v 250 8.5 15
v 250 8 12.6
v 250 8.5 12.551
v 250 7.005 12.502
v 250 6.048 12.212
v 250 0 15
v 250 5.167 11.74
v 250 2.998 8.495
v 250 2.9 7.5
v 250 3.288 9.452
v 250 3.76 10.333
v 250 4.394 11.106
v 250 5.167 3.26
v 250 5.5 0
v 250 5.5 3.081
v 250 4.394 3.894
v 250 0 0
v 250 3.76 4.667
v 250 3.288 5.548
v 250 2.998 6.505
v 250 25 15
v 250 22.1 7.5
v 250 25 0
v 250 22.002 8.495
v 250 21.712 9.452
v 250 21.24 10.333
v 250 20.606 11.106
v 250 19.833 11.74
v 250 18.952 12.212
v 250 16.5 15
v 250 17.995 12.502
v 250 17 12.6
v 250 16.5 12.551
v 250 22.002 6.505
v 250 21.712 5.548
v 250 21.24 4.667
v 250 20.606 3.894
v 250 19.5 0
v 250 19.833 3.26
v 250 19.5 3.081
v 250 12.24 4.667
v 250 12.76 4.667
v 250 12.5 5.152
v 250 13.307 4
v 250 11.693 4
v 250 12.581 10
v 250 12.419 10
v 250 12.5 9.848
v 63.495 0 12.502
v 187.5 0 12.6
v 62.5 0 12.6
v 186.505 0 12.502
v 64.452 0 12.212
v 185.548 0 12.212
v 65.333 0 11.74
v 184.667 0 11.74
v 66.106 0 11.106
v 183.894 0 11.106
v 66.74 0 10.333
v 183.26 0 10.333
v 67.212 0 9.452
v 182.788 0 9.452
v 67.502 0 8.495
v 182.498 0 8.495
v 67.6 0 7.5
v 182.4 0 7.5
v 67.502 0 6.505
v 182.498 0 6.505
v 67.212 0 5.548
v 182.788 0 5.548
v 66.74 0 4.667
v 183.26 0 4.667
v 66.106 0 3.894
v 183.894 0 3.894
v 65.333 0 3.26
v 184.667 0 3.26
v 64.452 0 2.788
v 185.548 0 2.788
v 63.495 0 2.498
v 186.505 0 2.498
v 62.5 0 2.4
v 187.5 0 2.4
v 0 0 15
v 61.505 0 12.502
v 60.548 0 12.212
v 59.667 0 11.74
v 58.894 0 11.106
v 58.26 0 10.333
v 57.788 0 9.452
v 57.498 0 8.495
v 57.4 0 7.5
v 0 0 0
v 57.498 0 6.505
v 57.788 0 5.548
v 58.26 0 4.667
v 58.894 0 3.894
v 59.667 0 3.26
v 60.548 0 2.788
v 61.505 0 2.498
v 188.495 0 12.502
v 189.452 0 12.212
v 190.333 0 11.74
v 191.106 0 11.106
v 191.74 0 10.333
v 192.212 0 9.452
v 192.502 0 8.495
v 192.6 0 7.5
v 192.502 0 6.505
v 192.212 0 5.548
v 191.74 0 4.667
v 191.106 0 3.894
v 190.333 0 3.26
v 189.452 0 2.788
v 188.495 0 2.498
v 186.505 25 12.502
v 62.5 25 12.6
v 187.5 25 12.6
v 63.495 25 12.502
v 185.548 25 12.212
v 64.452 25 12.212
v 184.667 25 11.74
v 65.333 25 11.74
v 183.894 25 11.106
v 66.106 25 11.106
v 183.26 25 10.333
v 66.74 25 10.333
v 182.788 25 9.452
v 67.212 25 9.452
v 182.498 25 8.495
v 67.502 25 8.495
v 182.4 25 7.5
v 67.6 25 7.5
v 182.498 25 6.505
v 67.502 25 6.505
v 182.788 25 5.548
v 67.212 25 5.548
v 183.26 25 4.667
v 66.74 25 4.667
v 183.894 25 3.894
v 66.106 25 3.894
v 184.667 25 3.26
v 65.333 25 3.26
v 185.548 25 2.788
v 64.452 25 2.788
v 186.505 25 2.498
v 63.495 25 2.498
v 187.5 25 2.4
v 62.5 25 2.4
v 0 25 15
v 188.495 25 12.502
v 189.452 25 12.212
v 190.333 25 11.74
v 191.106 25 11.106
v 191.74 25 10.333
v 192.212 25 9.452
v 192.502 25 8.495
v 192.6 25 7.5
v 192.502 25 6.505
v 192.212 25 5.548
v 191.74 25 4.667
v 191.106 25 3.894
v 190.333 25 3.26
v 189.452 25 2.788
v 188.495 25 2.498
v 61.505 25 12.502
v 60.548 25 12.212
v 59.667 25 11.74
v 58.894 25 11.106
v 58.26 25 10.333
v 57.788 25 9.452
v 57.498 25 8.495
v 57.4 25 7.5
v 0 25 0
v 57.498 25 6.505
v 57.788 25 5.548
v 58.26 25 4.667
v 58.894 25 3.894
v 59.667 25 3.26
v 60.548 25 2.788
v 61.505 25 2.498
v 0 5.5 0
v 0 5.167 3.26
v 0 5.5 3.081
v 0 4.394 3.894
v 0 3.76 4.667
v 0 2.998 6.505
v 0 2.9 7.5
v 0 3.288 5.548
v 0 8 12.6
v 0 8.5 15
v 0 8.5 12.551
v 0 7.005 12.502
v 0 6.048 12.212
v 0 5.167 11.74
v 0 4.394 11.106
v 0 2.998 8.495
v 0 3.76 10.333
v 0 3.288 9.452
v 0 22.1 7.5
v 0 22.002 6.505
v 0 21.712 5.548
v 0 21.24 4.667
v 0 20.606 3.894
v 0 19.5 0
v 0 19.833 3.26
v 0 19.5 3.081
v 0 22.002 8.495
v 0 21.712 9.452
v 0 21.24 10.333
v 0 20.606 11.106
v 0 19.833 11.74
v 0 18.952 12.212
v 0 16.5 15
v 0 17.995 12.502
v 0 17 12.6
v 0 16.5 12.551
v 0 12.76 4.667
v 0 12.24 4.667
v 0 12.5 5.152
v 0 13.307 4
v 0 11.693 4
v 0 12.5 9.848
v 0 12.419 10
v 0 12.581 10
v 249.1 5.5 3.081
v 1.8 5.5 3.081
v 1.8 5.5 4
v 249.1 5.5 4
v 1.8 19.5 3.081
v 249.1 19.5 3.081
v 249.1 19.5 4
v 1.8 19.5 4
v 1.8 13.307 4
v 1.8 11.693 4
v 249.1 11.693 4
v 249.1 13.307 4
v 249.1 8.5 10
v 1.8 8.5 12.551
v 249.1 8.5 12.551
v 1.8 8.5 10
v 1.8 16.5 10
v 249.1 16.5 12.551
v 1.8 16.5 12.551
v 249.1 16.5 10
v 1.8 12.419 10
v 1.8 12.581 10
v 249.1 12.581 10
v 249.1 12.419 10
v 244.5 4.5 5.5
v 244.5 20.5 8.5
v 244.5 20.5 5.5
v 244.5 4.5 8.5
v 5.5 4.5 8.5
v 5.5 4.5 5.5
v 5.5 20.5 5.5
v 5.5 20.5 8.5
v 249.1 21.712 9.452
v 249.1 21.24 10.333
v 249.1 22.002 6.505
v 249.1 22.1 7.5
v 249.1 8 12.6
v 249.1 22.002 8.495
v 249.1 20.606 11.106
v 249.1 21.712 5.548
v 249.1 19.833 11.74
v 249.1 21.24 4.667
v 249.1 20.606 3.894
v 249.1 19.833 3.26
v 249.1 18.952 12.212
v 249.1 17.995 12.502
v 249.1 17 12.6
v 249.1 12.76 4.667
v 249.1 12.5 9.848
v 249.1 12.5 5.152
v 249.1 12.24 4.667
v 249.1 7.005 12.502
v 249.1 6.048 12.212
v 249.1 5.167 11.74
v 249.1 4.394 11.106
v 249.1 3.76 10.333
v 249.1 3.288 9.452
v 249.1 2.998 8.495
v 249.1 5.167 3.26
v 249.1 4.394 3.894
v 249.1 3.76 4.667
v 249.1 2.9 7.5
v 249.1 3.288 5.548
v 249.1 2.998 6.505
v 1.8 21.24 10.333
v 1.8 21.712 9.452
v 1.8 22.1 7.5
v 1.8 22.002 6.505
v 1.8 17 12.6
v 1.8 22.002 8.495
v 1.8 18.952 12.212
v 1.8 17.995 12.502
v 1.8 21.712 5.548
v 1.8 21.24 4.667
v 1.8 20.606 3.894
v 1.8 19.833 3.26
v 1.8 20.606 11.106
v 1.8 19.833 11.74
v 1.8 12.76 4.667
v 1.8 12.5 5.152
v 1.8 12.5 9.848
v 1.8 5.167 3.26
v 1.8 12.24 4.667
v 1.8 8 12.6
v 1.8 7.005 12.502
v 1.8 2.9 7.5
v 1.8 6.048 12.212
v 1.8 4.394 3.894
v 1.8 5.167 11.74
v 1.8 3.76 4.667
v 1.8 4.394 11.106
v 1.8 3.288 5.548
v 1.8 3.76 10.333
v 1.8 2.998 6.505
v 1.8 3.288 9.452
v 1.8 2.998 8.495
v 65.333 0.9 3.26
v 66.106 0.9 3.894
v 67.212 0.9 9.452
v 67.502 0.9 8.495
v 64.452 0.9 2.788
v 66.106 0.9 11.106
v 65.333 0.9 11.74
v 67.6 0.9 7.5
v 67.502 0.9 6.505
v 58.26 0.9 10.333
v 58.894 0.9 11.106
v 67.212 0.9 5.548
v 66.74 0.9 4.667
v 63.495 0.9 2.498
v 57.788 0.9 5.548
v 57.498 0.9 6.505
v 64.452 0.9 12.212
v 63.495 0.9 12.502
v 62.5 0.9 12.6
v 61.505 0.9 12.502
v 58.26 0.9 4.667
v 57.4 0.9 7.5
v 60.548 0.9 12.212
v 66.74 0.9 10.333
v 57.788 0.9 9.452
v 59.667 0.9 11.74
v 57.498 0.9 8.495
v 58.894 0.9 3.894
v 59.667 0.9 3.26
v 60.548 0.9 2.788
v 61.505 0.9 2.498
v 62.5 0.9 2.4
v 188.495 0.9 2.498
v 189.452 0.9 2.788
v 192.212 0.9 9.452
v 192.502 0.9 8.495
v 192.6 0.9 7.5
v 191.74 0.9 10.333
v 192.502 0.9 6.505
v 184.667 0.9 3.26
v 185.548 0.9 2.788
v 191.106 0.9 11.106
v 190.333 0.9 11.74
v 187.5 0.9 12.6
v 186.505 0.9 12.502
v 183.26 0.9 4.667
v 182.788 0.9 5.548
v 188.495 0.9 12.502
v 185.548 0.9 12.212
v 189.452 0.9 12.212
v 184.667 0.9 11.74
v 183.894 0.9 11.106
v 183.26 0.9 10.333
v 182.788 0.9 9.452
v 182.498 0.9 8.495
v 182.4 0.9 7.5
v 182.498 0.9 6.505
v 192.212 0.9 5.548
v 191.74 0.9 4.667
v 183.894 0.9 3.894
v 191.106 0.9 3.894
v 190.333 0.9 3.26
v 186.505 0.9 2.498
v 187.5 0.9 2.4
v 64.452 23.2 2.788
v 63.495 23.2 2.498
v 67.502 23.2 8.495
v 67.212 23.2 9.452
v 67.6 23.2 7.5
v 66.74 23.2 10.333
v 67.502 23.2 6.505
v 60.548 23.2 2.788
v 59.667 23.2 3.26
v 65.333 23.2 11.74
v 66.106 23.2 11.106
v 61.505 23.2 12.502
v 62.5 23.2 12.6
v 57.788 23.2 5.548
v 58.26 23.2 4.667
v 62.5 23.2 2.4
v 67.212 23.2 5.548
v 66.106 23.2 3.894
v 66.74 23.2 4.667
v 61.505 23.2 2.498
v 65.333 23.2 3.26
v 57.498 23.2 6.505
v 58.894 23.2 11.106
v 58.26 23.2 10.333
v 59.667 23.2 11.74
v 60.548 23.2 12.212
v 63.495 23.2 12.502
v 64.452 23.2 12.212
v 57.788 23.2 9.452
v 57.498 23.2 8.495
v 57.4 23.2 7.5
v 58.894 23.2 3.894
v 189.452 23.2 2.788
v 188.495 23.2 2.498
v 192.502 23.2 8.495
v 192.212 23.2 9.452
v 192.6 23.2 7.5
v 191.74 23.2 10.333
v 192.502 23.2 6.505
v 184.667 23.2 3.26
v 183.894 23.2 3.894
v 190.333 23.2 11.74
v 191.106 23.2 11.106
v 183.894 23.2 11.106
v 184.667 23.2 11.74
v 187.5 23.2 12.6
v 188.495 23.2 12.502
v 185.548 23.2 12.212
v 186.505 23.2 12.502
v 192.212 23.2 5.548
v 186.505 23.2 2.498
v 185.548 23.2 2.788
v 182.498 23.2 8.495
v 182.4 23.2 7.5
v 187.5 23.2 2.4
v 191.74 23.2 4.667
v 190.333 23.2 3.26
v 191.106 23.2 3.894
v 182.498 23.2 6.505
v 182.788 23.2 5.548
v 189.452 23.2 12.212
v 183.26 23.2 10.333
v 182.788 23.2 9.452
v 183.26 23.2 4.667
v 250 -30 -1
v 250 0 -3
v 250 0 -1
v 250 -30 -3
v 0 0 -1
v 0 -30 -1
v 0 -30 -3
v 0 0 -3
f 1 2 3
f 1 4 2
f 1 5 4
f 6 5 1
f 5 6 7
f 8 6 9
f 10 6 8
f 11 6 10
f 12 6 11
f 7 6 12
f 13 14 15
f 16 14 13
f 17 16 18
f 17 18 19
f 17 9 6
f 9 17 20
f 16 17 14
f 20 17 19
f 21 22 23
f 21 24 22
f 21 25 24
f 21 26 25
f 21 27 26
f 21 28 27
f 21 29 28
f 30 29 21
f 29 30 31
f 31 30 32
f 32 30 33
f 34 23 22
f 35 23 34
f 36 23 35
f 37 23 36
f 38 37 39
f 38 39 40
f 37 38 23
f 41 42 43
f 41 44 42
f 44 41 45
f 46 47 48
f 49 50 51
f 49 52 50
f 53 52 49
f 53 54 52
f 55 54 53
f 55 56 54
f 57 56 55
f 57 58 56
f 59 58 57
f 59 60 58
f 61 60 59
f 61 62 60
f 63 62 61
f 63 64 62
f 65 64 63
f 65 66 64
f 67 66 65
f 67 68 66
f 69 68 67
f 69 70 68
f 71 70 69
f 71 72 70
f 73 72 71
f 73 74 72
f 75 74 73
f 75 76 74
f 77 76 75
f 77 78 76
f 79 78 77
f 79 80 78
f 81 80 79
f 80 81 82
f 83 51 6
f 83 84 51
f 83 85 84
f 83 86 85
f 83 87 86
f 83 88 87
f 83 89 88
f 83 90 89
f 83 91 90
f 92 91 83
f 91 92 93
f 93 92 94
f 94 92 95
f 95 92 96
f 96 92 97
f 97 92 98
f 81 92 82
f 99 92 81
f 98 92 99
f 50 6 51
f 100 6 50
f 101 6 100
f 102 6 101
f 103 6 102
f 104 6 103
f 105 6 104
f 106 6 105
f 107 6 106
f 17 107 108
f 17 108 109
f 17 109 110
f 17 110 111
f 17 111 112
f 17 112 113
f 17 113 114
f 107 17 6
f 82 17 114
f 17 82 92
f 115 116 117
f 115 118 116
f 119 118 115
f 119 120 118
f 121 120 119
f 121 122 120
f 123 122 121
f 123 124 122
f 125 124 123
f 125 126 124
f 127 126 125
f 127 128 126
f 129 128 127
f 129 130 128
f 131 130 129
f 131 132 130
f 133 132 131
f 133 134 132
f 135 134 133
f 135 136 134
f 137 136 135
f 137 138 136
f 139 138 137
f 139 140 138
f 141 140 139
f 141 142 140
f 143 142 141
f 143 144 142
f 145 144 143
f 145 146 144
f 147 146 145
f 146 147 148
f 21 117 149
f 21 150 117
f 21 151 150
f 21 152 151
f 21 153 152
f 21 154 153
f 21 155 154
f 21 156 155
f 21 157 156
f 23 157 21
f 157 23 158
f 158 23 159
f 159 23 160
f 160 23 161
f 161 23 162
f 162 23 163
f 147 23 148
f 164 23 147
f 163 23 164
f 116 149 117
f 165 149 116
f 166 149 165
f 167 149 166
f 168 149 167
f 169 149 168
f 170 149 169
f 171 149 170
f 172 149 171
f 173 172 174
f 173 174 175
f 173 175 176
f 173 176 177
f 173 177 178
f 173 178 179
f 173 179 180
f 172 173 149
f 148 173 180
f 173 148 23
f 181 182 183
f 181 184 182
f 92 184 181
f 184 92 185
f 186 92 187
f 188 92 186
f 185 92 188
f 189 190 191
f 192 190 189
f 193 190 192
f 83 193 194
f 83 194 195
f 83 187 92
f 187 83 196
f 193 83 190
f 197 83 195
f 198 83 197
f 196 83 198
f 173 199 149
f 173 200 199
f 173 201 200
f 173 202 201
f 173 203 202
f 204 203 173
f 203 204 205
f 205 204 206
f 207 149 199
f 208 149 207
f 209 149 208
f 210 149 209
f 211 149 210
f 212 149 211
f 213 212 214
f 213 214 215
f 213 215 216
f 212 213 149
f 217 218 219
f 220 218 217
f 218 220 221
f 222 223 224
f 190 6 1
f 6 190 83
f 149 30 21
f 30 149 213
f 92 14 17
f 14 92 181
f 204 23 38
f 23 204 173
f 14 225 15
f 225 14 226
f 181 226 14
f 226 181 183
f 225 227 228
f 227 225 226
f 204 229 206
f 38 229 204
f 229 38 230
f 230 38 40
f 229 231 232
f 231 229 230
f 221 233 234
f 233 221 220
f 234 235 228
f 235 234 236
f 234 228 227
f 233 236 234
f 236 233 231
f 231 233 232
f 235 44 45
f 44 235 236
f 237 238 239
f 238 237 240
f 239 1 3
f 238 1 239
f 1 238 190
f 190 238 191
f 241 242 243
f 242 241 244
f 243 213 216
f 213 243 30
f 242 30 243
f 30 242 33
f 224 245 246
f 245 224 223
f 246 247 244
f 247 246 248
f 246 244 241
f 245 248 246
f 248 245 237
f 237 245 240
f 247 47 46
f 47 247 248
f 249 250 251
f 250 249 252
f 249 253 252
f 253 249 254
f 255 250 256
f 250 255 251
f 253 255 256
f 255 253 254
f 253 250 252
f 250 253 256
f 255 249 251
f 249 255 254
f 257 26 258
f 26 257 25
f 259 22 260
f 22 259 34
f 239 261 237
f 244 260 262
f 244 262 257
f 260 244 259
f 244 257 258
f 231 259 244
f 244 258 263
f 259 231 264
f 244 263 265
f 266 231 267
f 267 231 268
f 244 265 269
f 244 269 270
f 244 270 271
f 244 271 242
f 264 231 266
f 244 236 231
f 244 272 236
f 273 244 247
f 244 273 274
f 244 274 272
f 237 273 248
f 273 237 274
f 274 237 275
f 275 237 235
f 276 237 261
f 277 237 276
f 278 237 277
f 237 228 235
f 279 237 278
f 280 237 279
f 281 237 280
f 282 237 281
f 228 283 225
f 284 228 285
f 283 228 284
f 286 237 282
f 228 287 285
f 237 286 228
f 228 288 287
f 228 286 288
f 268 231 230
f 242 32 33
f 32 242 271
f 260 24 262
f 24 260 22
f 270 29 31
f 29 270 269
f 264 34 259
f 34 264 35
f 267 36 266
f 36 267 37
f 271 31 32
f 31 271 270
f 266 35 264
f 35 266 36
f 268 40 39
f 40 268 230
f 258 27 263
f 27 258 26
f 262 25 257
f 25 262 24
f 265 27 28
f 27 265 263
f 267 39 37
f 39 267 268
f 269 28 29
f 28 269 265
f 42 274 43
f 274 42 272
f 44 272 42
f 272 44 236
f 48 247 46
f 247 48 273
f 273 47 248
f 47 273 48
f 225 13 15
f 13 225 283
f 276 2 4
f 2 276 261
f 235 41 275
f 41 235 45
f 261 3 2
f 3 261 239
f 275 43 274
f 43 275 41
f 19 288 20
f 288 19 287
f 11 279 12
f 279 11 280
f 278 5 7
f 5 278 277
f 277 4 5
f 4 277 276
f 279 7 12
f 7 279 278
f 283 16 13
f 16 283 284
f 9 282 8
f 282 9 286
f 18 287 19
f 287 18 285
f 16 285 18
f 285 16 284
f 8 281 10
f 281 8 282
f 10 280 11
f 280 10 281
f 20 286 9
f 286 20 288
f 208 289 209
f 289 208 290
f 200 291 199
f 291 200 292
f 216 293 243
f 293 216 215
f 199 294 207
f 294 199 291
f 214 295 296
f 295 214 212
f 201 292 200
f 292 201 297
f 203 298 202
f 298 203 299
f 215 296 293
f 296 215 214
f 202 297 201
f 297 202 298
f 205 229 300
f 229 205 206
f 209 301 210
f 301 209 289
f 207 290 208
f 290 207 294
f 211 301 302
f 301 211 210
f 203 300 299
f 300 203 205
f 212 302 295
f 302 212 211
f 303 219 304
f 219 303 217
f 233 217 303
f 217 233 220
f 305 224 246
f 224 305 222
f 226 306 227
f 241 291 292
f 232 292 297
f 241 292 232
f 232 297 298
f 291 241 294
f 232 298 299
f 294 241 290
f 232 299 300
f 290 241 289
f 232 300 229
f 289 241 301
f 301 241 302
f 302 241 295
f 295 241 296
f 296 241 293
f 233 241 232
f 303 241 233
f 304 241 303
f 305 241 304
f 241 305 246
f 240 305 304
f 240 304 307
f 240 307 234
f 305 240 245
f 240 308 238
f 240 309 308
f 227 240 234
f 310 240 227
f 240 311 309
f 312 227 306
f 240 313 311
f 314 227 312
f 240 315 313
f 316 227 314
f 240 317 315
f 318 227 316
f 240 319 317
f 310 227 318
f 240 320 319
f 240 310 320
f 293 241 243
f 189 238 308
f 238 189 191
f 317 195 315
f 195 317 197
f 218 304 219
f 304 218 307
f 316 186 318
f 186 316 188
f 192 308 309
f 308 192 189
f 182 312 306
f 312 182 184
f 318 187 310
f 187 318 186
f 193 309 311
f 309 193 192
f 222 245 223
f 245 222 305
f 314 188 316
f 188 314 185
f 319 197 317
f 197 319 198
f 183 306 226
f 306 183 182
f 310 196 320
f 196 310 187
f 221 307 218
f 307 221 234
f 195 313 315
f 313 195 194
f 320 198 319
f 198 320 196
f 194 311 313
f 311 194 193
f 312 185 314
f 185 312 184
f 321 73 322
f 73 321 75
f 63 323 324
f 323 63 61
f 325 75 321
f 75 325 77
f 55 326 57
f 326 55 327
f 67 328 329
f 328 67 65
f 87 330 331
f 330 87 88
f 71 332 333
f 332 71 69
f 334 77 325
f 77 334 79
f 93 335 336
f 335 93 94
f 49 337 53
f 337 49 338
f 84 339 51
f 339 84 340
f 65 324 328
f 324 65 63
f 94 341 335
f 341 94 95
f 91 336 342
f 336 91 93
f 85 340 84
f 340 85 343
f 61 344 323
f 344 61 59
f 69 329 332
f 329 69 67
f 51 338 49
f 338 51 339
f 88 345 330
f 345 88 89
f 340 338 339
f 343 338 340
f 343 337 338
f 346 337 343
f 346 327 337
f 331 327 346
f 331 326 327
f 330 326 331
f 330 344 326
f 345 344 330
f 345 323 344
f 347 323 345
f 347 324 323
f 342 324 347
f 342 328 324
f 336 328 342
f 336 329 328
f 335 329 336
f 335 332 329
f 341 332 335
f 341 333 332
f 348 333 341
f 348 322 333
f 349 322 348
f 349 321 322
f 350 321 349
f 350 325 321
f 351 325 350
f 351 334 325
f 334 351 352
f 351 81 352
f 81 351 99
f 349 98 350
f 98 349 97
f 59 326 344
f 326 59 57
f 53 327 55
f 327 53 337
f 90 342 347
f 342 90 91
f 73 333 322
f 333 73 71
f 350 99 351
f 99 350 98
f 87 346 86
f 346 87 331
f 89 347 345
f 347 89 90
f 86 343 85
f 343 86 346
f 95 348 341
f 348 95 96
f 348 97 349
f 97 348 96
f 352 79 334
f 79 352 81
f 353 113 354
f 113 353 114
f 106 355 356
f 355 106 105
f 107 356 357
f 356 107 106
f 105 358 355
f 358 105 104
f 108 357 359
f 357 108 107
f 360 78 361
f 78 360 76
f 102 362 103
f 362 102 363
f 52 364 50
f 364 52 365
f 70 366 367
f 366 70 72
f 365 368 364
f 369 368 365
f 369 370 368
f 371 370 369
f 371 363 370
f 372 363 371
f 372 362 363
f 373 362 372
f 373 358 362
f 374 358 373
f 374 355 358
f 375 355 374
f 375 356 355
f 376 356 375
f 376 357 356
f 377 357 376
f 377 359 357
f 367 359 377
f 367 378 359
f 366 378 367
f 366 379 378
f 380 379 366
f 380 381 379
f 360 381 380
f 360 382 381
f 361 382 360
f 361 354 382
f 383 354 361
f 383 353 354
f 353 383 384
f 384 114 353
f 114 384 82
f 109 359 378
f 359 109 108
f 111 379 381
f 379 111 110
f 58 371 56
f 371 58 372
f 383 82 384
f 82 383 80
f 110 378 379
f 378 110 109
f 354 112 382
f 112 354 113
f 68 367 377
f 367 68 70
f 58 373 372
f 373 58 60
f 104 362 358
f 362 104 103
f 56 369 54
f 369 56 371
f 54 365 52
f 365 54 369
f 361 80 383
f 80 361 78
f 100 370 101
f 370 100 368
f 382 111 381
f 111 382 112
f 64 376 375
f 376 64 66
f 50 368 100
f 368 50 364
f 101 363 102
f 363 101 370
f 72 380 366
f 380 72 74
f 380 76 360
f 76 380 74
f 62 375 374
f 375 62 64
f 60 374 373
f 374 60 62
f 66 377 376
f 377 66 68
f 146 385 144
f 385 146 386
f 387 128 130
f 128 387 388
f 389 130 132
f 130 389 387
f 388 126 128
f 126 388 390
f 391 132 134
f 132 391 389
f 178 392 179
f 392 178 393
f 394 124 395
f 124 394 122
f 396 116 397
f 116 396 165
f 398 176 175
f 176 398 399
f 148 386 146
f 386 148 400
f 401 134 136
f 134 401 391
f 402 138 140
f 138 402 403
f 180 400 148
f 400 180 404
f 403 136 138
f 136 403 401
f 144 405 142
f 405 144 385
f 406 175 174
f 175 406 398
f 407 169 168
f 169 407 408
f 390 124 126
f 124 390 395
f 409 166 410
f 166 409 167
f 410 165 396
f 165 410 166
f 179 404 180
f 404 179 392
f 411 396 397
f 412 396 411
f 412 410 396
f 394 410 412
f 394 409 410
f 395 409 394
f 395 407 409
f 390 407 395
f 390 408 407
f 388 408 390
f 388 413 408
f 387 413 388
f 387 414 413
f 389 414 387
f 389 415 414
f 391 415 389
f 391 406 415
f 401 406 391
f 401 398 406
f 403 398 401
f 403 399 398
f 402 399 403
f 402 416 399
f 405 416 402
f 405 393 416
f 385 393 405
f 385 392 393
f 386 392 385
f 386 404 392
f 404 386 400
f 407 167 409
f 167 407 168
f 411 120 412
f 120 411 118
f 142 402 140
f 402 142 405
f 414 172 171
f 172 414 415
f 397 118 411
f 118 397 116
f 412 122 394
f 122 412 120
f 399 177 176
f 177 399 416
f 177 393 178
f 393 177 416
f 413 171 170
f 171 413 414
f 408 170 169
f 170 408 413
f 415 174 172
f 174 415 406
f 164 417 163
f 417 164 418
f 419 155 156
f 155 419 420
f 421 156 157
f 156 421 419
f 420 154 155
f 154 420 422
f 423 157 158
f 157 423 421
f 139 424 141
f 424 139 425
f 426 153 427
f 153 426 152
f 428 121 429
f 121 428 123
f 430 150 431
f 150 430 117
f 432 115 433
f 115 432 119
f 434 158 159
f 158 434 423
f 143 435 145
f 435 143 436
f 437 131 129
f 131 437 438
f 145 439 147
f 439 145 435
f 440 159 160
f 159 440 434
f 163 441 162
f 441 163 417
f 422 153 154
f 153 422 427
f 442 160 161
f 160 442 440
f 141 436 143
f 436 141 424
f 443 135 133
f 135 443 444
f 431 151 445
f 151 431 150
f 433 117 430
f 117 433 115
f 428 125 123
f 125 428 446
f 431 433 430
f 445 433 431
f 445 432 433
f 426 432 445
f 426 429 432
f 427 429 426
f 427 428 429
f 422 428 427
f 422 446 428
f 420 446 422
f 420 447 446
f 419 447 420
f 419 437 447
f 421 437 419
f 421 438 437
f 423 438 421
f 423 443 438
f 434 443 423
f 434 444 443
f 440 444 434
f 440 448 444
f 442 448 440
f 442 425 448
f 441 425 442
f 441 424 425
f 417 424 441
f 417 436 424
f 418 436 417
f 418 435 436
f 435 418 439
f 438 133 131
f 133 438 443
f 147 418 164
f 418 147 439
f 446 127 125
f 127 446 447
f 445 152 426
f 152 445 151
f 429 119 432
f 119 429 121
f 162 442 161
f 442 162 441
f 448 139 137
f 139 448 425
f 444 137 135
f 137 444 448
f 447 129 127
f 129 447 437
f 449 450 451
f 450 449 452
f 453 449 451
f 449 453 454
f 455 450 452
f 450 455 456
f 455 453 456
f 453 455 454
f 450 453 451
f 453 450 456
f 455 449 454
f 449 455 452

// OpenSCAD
// file: single_module.scad
/*
 * Single LED Strip Module - Minimal Design
 * Compact holder for one section of WS2812B LED strip
 *
 * Features:
 * - Minimal size - just enough to hold the strip
 * - 4 magnet holes for modular connections
 * - Lightweight and movable
 */

// ========== CONFIGURATION ==========

// LED Strip dimensions
strip_segment_length = 250;  // Length of this module
strip_width = 12;            // WS2812B strip width

// Module dimensions (MINIMIZED)
module_width = strip_segment_length;
module_height = 25;          // 2.5cm vertical spacing (compact!)
module_depth = 15;           // Reduced from 20mm to 15mm
wall_thickness = 1.5;        // Reduced from 2mm to 1.5mm

// LED channel (on front)
led_channel_depth = 4;       // Shallow groove (reduced from 5mm)
led_channel_width = 14;      // Increased to 14mm for better fit

// Wire channel (on back)
wire_channel_width = 8;      // Narrow channel for wires
wire_channel_depth = 5;      // Back routing space

// Magnets (user's magnets: 10mm dia × 1.54mm thick)
magnet_dia = 10.2;           // 10mm + 0.2mm tolerance
magnet_thickness = 1.8;      // 1.54mm + tolerance (thin!)
magnet_inset = 8;            // Distance from edges (adjusted for 25mm height)

// ========== SINGLE MODULE ==========

module minimal_strip_holder() {
    difference() {
        // Main body - thin shell
        cube([module_width, module_depth, module_height]);

        // Front LED channel (OPEN ENDS - strip passes through)
        translate([-0.1, -0.1, module_height/2 - led_channel_width/2])
            cube([module_width + 0.2,  // Goes all the way through left to right
                  led_channel_depth + 0.1,
                  led_channel_width]);

        // Back wire channel (OPEN ENDS - wires pass through)
        translate([-0.1, module_depth - wire_channel_depth, module_height/2 - wire_channel_width/2])
            cube([module_width + 0.2,  // Goes all the way through left to right
                  wire_channel_depth + 0.1,
                  wire_channel_width]);

        // Center cavity (weight reduction)
        translate([wall_thickness + 4,
                  led_channel_depth + wall_thickness,
                  wall_thickness + 3])
            cube([module_width - 2*wall_thickness - 8,
                  module_depth - led_channel_depth - wire_channel_depth - 2*wall_thickness,
                  module_height - 2*wall_thickness - 6]);

        // HORIZONTAL magnets (left/right)
        // Right side
        translate([module_width - magnet_thickness/2, module_depth/2, magnet_inset])
            rotate([0, 90, 0])
            cylinder(h=magnet_thickness + 0.1, d=magnet_dia, $fn=32);
        translate([module_width - magnet_thickness/2, module_depth/2, module_height - magnet_inset])
            rotate([0, 90, 0])
            cylinder(h=magnet_thickness + 0.1, d=magnet_dia, $fn=32);

        // Left side
        translate([-0.1, module_depth/2, magnet_inset])
            rotate([0, 90, 0])
            cylinder(h=magnet_thickness + 0.1, d=magnet_dia, $fn=32);
        translate([-0.1, module_depth/2, module_height - magnet_inset])
            rotate([0, 90, 0])
            cylinder(h=magnet_thickness + 0.1, d=magnet_dia, $fn=32);

        // VERTICAL magnets (top/bottom)
        // Top
        translate([module_width/4, module_depth/2, module_height - magnet_thickness/2])
            cylinder(h=magnet_thickness + 0.1, d=magnet_dia, $fn=32);
        translate([3*module_width/4, module_depth/2, module_height - magnet_thickness/2])
            cylinder(h=magnet_thickness + 0.1, d=magnet_dia, $fn=32);

        // Bottom
        translate([module_width/4, module_depth/2, -0.1])
            cylinder(h=magnet_thickness + 0.1, d=magnet_dia, $fn=32);
        translate([3*module_width/4, module_depth/2, -0.1])
            cylinder(h=magnet_thickness + 0.1, d=magnet_dia, $fn=32);
    }
}

// LED strip visualization (optional)
module led_strip_visual() {
    color("white", 0.9)
    translate([wall_thickness, led_channel_depth - 3, module_height/2 - strip_width/2])
    rotate([90, 0, 0])
    cube([module_width - 2*wall_thickness, strip_width, 3]);

    // LEDs
    led_spacing = module_width / 36;  // 36 LEDs per module
    for (i = [0:35]) {
        color("gold", 0.8)
        translate([i * led_spacing + led_spacing/2,
                  1,
                  module_height/2])
            rotate([90, 0, 0])
            cylinder(h=2, d=4, $fn=6);
    }
}

// ========== RENDER ==========

// Show module
minimal_strip_holder();

// Show LED strip (uncomment to visualize)
// led_strip_visual();

// ========== EXPORT NOTES ==========
/*
 * DIMENSIONS:
 * - Size: 250mm (W) × 50mm (H) × 15mm (D)
 * - Weight: ~15-18g per module (at 15% infill)
 * - Wall thickness: 1.5mm
 *
 * MAGNETS:
 * - 4× 10mm × 3mm neodymium magnets per module
 * - Amazon: "neodymium magnets 10mm x 3mm N52"
 *
 * PRINTING:
 * - Layer height: 0.2mm
 * - Infill: 15%
 * - No supports needed
 * - Print time: ~1-1.5 hours per module
 *
 * CUSTOMIZATION:
 * - Adjust module_width for different lengths (e.g., 200mm, 333mm)
 * - Change module_height for different spacing (e.g., 30mm, 40mm, 60mm)
 * - Modify led_channel_width if your strip is wider/narrower
 *
 * EXPORT STL:
 * openscad -o module.stl single_module.scad
 */
// main file
use <single_module.scad>

// BAD orientation - wide 25mm face on bed (rotated 90 degrees)
rotate([90, 0, 0])
    translate([0, 0, -25])
    minimal_strip_holder();

// Build plate
translate([0, -30, -3])
    color("red", 0.5)
    cube([250, 30, 2]);
